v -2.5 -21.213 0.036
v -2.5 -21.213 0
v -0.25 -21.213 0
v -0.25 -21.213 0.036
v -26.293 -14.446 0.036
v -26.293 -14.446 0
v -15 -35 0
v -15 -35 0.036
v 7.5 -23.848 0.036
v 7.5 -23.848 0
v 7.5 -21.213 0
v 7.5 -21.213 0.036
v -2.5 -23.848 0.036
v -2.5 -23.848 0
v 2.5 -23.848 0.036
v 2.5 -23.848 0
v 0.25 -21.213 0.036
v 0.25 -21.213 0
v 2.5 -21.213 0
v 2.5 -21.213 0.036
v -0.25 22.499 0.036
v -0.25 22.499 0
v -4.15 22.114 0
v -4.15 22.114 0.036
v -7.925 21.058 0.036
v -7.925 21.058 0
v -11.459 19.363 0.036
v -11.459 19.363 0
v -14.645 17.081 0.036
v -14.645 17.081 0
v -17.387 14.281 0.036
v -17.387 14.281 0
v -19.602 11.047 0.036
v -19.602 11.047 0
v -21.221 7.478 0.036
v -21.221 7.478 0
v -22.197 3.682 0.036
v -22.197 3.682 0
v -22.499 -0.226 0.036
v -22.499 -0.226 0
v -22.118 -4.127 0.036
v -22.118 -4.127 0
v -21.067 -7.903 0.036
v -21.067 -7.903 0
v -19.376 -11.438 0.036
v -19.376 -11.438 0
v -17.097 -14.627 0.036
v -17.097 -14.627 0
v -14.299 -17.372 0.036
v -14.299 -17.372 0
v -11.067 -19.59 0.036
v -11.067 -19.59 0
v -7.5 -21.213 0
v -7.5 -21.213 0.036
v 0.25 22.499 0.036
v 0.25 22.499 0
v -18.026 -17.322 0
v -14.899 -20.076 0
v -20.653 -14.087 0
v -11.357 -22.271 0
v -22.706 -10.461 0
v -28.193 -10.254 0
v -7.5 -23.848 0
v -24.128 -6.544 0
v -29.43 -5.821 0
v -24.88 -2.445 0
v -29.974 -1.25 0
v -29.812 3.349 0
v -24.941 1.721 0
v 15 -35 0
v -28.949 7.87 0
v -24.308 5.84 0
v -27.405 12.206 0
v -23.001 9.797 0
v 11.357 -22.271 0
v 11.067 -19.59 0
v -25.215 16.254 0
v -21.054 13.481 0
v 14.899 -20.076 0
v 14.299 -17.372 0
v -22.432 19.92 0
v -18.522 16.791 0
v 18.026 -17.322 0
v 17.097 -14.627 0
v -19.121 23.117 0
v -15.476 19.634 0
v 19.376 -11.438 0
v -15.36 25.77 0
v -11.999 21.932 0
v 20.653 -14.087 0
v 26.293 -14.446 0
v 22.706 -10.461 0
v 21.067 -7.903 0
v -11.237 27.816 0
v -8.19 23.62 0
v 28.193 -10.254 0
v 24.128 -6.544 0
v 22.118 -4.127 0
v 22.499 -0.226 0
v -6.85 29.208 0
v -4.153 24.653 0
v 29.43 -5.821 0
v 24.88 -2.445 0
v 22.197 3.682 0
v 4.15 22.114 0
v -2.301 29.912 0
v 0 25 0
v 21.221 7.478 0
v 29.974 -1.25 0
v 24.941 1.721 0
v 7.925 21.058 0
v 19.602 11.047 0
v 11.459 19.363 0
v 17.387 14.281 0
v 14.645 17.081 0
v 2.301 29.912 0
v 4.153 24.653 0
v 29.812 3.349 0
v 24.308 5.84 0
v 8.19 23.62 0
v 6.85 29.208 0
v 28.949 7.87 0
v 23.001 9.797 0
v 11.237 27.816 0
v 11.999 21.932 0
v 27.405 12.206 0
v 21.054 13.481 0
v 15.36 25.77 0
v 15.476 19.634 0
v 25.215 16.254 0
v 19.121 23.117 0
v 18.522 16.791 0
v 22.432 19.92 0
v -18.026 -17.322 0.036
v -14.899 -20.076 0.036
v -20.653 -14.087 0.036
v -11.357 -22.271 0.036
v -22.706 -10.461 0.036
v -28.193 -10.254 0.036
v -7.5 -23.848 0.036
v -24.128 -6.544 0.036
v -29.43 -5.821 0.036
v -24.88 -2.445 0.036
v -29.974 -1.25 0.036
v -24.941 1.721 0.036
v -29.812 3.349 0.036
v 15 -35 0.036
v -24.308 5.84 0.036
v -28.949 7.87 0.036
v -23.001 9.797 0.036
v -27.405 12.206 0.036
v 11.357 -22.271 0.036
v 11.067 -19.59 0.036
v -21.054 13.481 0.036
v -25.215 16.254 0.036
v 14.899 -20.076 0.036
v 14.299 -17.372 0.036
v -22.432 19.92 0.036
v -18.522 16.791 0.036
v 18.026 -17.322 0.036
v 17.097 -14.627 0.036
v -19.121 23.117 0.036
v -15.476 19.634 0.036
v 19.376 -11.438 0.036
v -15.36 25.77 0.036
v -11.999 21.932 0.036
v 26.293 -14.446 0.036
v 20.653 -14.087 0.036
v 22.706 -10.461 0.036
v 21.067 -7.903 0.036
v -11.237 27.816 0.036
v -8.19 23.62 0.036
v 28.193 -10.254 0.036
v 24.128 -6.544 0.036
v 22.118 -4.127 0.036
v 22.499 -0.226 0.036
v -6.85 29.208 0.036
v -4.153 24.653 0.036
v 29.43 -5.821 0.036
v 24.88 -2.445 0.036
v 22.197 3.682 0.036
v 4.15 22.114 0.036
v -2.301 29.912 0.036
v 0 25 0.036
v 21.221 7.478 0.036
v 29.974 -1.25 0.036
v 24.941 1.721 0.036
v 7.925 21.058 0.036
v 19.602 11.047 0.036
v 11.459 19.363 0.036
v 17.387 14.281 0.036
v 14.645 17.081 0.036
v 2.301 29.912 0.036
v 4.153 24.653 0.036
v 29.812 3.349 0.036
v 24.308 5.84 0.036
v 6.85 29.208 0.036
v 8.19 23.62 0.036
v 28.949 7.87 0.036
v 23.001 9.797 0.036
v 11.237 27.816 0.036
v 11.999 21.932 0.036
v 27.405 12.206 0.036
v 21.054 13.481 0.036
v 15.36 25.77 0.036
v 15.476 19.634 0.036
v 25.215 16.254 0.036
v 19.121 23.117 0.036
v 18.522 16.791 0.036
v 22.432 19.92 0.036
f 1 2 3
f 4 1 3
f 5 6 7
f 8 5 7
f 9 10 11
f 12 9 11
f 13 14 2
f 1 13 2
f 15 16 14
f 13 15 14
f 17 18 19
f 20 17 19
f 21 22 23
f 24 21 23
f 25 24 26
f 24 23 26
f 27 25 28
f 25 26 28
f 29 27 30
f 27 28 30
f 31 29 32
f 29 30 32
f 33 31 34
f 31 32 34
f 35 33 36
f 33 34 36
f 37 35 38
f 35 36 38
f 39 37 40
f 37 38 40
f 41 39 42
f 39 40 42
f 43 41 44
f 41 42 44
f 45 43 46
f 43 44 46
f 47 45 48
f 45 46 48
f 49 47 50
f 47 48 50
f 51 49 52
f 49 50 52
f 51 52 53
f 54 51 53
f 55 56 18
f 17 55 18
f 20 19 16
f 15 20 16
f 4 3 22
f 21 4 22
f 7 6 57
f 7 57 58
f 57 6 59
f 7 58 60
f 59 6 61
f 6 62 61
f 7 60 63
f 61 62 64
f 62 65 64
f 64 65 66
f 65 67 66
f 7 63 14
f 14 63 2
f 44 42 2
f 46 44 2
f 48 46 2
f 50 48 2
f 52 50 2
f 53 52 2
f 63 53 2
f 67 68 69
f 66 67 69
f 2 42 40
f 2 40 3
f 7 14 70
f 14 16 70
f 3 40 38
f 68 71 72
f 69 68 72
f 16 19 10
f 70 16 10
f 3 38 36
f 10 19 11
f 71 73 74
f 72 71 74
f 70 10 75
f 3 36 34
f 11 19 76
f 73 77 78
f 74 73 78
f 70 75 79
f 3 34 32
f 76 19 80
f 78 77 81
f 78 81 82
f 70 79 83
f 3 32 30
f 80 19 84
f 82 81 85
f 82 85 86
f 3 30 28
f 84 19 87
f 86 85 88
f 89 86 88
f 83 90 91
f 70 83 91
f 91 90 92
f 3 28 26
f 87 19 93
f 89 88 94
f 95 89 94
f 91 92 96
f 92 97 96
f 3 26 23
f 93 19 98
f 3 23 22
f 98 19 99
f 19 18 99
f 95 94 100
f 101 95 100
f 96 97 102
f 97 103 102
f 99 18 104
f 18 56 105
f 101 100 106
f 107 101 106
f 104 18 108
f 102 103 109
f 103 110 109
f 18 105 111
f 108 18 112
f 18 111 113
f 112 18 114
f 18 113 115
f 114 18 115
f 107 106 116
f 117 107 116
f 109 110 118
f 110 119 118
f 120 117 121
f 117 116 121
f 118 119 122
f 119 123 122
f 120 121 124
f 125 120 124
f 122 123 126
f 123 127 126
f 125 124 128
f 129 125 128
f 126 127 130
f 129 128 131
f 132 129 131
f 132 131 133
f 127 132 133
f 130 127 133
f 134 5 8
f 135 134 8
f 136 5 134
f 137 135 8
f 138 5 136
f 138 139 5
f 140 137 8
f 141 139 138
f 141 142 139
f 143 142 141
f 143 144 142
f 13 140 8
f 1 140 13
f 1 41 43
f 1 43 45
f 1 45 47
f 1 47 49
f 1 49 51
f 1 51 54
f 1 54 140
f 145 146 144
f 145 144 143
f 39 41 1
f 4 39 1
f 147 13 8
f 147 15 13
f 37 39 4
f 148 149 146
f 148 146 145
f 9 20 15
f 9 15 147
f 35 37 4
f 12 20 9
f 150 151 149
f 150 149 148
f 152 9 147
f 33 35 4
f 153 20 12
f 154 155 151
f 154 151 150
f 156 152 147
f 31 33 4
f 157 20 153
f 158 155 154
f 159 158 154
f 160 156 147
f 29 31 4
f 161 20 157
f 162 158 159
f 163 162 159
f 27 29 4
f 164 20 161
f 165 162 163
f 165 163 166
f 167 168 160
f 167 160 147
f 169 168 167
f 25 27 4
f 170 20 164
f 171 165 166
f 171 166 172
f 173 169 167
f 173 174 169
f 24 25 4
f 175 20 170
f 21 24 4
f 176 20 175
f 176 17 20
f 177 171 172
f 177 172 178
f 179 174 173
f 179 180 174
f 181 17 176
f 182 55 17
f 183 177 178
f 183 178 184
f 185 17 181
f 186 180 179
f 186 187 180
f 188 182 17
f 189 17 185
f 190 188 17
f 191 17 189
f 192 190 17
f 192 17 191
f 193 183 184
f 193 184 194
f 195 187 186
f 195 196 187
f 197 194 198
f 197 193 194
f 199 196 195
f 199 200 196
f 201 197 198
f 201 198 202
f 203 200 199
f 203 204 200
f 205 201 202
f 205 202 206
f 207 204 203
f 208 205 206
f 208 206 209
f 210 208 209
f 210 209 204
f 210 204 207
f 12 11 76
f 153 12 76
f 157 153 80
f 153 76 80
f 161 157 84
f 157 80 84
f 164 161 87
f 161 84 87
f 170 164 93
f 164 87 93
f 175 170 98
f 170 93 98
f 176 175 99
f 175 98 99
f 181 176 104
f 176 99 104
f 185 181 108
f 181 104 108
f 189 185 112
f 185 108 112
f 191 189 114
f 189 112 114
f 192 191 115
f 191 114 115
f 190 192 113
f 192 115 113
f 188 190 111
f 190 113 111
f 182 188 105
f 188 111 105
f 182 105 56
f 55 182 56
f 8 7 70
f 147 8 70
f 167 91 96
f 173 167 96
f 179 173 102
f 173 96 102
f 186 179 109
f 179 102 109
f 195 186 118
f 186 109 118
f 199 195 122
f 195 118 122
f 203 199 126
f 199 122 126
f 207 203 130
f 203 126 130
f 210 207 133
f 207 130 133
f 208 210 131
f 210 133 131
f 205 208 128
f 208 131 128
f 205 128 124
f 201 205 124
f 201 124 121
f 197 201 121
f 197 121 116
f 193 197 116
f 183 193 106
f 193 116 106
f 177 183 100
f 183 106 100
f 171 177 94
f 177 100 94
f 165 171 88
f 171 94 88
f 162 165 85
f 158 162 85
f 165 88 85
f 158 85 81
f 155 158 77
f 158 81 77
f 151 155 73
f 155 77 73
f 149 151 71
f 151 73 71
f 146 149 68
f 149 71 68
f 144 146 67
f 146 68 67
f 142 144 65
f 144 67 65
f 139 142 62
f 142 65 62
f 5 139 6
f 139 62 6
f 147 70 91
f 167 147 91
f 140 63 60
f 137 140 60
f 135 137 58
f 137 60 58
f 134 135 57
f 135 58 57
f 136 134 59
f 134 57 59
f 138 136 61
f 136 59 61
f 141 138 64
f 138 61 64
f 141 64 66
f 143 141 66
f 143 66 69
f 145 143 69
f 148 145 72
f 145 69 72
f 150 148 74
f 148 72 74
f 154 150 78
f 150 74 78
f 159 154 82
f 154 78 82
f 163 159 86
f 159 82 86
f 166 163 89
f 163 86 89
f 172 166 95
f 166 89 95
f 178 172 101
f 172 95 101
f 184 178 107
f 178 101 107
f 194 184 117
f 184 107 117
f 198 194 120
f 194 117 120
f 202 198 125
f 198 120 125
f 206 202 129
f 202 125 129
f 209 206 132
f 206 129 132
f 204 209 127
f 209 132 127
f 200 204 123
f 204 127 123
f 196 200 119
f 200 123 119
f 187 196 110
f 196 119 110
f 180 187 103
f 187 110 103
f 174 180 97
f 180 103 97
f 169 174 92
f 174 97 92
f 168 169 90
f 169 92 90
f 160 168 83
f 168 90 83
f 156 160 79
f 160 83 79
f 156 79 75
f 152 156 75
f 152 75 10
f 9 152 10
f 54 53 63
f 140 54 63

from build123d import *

# Parameters (mm, degrees)
BOSS_EXTRUDE1_DEPTH = 0.03556


with BuildPart() as part:
    # Sketch2 → Boss-Extrude1 (new body)
    with BuildSketch(Plane.XY):
        with BuildLine():
            Line((-7.5, -35.000000035), (0, -35.000000035))
            Line((0, -35.000000035), (7.5, -35.000000035))
            Line((7.5, -35.000000035), (15, -35.000000035))
            Line((15, -35.000000035), (26.292884658, -14.44590656))
            ThreePointArc((26.292884658, -14.44590656), (0, 30), (-26.292884658, -14.44590656))
            Line((-26.292884658, -14.44590656), (-15, -35.000000035))
            Line((-15, -35.000000035), (-7.5, -35.000000035))
        make_face()
        with BuildLine():
            Line((0.25, 22.498611068), (0.25, -21.213203436))
            Line((0.25, -21.213203436), (2.5, -21.213203436))
            Line((2.5, -21.213203436), (2.5, -23.848480036))
            Line((2.5, -23.848480036), (-2.5, -23.848480036))
            Line((-2.5, -23.848480036), (-2.5, -21.213203436))
            Line((-2.5, -21.213203436), (-0.25, -21.213203436))
            Line((-0.25, -21.213203436), (-0.25, 22.498611068))
            ThreePointArc((-0.25, 22.498611068), (-22.196763431, 3.681534082), (-7.5, -21.213203436))
            Line((-7.5, -21.213203436), (-7.5, -23.848480035))
            ThreePointArc((-7.5, -23.848480035), (0, 25), (7.5, -23.848480035))
            Line((7.5, -23.848480035), (7.5, -21.213203436))
            ThreePointArc((7.5, -21.213203436), (22.196763431, 3.681534082), (0.25, 22.498611068))
        make_face(mode=Mode.SUBTRACT)
    extrude(amount=BOSS_EXTRUDE1_DEPTH)


solid = part.part
